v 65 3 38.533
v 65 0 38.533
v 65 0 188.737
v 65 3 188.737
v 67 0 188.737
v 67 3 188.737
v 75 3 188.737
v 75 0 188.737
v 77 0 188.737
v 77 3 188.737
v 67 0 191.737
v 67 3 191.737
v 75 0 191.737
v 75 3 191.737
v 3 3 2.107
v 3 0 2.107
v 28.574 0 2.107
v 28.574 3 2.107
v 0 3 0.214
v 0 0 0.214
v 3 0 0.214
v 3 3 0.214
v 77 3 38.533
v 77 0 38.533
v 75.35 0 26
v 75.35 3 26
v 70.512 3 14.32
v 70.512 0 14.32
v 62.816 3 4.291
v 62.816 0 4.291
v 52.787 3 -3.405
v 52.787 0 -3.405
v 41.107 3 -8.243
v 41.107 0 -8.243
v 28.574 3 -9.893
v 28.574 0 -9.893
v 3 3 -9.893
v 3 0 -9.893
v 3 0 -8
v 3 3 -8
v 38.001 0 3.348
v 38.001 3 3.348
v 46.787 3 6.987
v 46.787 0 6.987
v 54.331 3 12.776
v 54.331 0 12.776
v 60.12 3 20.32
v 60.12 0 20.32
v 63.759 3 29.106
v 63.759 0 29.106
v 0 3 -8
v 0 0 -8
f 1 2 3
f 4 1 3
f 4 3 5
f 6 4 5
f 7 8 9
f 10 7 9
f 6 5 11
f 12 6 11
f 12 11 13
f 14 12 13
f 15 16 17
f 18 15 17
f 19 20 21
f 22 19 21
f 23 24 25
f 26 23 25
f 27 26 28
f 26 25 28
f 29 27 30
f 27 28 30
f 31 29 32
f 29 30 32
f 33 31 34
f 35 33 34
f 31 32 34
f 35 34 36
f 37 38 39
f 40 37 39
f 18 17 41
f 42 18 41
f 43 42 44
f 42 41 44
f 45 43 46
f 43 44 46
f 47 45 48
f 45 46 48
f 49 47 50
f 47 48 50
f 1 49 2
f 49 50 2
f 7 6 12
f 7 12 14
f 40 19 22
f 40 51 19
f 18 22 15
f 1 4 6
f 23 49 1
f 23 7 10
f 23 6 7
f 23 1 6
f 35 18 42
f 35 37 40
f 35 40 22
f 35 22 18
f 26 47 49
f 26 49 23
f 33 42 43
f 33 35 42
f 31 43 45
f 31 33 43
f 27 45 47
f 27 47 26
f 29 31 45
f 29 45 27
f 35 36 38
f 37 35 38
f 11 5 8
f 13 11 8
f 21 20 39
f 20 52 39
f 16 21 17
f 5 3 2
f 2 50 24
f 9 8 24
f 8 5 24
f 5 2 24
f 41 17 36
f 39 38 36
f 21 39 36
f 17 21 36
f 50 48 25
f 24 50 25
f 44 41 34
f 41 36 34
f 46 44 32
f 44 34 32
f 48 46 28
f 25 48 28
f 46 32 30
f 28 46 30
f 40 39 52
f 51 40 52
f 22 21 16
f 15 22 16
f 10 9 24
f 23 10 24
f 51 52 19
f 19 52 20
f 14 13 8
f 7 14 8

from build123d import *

# Parameters (mm, degrees)
SALIENTE_EXTRUIR1_DEPTH = 3


with BuildPart() as part:
    # Croquis1 → Saliente-Extruir1 (new body)
    with BuildSketch(Plane(origin=(0, 0, 0), x_dir=(1, 0, 0), z_dir=(0, 1, 0))):
        with BuildLine():
            Line((0, 7.786096257), (0, 0))
            Line((0, 0), (0, -0.213903743))
            Line((0, -0.213903743), (3, -0.213903743))
            Line((3, -0.213903743), (3, -2.106951872))
            Line((3, -2.106951872), (7.35828877, -2.106951872))
            Line((7.35828877, -2.106951872), (28.573593129, -2.106951872))
            ThreePointArc((28.573593129, -2.106951872), (54.330952442, -12.77599943), (65, -38.533358743))
            Line((65, -38.533358743), (65, -117.736951872))
            Line((65, -117.736951872), (65, -188.736951872))
            Line((65, -188.736951872), (67, -188.736951872))
            Line((67, -188.736951872), (67, -191.736951872))
            Line((67, -191.736951872), (75, -191.736951872))
            Line((75, -191.736951872), (75, -188.736951872))
            Line((75, -188.736951872), (77, -188.736951872))
            Line((77, -188.736951872), (77, -38.533358743))
            ThreePointArc((77, -38.533358743), (62.816233816, -4.290718056), (28.573593129, 9.893048128))
            Line((28.573593129, 9.893048128), (3, 9.893048128))
            Line((3, 9.893048128), (3, 8))
            Line((3, 8), (0, 8))
            Line((0, 8), (0, 7.786096257))
        make_face()
    extrude(amount=SALIENTE_EXTRUIR1_DEPTH)


solid = part.part
